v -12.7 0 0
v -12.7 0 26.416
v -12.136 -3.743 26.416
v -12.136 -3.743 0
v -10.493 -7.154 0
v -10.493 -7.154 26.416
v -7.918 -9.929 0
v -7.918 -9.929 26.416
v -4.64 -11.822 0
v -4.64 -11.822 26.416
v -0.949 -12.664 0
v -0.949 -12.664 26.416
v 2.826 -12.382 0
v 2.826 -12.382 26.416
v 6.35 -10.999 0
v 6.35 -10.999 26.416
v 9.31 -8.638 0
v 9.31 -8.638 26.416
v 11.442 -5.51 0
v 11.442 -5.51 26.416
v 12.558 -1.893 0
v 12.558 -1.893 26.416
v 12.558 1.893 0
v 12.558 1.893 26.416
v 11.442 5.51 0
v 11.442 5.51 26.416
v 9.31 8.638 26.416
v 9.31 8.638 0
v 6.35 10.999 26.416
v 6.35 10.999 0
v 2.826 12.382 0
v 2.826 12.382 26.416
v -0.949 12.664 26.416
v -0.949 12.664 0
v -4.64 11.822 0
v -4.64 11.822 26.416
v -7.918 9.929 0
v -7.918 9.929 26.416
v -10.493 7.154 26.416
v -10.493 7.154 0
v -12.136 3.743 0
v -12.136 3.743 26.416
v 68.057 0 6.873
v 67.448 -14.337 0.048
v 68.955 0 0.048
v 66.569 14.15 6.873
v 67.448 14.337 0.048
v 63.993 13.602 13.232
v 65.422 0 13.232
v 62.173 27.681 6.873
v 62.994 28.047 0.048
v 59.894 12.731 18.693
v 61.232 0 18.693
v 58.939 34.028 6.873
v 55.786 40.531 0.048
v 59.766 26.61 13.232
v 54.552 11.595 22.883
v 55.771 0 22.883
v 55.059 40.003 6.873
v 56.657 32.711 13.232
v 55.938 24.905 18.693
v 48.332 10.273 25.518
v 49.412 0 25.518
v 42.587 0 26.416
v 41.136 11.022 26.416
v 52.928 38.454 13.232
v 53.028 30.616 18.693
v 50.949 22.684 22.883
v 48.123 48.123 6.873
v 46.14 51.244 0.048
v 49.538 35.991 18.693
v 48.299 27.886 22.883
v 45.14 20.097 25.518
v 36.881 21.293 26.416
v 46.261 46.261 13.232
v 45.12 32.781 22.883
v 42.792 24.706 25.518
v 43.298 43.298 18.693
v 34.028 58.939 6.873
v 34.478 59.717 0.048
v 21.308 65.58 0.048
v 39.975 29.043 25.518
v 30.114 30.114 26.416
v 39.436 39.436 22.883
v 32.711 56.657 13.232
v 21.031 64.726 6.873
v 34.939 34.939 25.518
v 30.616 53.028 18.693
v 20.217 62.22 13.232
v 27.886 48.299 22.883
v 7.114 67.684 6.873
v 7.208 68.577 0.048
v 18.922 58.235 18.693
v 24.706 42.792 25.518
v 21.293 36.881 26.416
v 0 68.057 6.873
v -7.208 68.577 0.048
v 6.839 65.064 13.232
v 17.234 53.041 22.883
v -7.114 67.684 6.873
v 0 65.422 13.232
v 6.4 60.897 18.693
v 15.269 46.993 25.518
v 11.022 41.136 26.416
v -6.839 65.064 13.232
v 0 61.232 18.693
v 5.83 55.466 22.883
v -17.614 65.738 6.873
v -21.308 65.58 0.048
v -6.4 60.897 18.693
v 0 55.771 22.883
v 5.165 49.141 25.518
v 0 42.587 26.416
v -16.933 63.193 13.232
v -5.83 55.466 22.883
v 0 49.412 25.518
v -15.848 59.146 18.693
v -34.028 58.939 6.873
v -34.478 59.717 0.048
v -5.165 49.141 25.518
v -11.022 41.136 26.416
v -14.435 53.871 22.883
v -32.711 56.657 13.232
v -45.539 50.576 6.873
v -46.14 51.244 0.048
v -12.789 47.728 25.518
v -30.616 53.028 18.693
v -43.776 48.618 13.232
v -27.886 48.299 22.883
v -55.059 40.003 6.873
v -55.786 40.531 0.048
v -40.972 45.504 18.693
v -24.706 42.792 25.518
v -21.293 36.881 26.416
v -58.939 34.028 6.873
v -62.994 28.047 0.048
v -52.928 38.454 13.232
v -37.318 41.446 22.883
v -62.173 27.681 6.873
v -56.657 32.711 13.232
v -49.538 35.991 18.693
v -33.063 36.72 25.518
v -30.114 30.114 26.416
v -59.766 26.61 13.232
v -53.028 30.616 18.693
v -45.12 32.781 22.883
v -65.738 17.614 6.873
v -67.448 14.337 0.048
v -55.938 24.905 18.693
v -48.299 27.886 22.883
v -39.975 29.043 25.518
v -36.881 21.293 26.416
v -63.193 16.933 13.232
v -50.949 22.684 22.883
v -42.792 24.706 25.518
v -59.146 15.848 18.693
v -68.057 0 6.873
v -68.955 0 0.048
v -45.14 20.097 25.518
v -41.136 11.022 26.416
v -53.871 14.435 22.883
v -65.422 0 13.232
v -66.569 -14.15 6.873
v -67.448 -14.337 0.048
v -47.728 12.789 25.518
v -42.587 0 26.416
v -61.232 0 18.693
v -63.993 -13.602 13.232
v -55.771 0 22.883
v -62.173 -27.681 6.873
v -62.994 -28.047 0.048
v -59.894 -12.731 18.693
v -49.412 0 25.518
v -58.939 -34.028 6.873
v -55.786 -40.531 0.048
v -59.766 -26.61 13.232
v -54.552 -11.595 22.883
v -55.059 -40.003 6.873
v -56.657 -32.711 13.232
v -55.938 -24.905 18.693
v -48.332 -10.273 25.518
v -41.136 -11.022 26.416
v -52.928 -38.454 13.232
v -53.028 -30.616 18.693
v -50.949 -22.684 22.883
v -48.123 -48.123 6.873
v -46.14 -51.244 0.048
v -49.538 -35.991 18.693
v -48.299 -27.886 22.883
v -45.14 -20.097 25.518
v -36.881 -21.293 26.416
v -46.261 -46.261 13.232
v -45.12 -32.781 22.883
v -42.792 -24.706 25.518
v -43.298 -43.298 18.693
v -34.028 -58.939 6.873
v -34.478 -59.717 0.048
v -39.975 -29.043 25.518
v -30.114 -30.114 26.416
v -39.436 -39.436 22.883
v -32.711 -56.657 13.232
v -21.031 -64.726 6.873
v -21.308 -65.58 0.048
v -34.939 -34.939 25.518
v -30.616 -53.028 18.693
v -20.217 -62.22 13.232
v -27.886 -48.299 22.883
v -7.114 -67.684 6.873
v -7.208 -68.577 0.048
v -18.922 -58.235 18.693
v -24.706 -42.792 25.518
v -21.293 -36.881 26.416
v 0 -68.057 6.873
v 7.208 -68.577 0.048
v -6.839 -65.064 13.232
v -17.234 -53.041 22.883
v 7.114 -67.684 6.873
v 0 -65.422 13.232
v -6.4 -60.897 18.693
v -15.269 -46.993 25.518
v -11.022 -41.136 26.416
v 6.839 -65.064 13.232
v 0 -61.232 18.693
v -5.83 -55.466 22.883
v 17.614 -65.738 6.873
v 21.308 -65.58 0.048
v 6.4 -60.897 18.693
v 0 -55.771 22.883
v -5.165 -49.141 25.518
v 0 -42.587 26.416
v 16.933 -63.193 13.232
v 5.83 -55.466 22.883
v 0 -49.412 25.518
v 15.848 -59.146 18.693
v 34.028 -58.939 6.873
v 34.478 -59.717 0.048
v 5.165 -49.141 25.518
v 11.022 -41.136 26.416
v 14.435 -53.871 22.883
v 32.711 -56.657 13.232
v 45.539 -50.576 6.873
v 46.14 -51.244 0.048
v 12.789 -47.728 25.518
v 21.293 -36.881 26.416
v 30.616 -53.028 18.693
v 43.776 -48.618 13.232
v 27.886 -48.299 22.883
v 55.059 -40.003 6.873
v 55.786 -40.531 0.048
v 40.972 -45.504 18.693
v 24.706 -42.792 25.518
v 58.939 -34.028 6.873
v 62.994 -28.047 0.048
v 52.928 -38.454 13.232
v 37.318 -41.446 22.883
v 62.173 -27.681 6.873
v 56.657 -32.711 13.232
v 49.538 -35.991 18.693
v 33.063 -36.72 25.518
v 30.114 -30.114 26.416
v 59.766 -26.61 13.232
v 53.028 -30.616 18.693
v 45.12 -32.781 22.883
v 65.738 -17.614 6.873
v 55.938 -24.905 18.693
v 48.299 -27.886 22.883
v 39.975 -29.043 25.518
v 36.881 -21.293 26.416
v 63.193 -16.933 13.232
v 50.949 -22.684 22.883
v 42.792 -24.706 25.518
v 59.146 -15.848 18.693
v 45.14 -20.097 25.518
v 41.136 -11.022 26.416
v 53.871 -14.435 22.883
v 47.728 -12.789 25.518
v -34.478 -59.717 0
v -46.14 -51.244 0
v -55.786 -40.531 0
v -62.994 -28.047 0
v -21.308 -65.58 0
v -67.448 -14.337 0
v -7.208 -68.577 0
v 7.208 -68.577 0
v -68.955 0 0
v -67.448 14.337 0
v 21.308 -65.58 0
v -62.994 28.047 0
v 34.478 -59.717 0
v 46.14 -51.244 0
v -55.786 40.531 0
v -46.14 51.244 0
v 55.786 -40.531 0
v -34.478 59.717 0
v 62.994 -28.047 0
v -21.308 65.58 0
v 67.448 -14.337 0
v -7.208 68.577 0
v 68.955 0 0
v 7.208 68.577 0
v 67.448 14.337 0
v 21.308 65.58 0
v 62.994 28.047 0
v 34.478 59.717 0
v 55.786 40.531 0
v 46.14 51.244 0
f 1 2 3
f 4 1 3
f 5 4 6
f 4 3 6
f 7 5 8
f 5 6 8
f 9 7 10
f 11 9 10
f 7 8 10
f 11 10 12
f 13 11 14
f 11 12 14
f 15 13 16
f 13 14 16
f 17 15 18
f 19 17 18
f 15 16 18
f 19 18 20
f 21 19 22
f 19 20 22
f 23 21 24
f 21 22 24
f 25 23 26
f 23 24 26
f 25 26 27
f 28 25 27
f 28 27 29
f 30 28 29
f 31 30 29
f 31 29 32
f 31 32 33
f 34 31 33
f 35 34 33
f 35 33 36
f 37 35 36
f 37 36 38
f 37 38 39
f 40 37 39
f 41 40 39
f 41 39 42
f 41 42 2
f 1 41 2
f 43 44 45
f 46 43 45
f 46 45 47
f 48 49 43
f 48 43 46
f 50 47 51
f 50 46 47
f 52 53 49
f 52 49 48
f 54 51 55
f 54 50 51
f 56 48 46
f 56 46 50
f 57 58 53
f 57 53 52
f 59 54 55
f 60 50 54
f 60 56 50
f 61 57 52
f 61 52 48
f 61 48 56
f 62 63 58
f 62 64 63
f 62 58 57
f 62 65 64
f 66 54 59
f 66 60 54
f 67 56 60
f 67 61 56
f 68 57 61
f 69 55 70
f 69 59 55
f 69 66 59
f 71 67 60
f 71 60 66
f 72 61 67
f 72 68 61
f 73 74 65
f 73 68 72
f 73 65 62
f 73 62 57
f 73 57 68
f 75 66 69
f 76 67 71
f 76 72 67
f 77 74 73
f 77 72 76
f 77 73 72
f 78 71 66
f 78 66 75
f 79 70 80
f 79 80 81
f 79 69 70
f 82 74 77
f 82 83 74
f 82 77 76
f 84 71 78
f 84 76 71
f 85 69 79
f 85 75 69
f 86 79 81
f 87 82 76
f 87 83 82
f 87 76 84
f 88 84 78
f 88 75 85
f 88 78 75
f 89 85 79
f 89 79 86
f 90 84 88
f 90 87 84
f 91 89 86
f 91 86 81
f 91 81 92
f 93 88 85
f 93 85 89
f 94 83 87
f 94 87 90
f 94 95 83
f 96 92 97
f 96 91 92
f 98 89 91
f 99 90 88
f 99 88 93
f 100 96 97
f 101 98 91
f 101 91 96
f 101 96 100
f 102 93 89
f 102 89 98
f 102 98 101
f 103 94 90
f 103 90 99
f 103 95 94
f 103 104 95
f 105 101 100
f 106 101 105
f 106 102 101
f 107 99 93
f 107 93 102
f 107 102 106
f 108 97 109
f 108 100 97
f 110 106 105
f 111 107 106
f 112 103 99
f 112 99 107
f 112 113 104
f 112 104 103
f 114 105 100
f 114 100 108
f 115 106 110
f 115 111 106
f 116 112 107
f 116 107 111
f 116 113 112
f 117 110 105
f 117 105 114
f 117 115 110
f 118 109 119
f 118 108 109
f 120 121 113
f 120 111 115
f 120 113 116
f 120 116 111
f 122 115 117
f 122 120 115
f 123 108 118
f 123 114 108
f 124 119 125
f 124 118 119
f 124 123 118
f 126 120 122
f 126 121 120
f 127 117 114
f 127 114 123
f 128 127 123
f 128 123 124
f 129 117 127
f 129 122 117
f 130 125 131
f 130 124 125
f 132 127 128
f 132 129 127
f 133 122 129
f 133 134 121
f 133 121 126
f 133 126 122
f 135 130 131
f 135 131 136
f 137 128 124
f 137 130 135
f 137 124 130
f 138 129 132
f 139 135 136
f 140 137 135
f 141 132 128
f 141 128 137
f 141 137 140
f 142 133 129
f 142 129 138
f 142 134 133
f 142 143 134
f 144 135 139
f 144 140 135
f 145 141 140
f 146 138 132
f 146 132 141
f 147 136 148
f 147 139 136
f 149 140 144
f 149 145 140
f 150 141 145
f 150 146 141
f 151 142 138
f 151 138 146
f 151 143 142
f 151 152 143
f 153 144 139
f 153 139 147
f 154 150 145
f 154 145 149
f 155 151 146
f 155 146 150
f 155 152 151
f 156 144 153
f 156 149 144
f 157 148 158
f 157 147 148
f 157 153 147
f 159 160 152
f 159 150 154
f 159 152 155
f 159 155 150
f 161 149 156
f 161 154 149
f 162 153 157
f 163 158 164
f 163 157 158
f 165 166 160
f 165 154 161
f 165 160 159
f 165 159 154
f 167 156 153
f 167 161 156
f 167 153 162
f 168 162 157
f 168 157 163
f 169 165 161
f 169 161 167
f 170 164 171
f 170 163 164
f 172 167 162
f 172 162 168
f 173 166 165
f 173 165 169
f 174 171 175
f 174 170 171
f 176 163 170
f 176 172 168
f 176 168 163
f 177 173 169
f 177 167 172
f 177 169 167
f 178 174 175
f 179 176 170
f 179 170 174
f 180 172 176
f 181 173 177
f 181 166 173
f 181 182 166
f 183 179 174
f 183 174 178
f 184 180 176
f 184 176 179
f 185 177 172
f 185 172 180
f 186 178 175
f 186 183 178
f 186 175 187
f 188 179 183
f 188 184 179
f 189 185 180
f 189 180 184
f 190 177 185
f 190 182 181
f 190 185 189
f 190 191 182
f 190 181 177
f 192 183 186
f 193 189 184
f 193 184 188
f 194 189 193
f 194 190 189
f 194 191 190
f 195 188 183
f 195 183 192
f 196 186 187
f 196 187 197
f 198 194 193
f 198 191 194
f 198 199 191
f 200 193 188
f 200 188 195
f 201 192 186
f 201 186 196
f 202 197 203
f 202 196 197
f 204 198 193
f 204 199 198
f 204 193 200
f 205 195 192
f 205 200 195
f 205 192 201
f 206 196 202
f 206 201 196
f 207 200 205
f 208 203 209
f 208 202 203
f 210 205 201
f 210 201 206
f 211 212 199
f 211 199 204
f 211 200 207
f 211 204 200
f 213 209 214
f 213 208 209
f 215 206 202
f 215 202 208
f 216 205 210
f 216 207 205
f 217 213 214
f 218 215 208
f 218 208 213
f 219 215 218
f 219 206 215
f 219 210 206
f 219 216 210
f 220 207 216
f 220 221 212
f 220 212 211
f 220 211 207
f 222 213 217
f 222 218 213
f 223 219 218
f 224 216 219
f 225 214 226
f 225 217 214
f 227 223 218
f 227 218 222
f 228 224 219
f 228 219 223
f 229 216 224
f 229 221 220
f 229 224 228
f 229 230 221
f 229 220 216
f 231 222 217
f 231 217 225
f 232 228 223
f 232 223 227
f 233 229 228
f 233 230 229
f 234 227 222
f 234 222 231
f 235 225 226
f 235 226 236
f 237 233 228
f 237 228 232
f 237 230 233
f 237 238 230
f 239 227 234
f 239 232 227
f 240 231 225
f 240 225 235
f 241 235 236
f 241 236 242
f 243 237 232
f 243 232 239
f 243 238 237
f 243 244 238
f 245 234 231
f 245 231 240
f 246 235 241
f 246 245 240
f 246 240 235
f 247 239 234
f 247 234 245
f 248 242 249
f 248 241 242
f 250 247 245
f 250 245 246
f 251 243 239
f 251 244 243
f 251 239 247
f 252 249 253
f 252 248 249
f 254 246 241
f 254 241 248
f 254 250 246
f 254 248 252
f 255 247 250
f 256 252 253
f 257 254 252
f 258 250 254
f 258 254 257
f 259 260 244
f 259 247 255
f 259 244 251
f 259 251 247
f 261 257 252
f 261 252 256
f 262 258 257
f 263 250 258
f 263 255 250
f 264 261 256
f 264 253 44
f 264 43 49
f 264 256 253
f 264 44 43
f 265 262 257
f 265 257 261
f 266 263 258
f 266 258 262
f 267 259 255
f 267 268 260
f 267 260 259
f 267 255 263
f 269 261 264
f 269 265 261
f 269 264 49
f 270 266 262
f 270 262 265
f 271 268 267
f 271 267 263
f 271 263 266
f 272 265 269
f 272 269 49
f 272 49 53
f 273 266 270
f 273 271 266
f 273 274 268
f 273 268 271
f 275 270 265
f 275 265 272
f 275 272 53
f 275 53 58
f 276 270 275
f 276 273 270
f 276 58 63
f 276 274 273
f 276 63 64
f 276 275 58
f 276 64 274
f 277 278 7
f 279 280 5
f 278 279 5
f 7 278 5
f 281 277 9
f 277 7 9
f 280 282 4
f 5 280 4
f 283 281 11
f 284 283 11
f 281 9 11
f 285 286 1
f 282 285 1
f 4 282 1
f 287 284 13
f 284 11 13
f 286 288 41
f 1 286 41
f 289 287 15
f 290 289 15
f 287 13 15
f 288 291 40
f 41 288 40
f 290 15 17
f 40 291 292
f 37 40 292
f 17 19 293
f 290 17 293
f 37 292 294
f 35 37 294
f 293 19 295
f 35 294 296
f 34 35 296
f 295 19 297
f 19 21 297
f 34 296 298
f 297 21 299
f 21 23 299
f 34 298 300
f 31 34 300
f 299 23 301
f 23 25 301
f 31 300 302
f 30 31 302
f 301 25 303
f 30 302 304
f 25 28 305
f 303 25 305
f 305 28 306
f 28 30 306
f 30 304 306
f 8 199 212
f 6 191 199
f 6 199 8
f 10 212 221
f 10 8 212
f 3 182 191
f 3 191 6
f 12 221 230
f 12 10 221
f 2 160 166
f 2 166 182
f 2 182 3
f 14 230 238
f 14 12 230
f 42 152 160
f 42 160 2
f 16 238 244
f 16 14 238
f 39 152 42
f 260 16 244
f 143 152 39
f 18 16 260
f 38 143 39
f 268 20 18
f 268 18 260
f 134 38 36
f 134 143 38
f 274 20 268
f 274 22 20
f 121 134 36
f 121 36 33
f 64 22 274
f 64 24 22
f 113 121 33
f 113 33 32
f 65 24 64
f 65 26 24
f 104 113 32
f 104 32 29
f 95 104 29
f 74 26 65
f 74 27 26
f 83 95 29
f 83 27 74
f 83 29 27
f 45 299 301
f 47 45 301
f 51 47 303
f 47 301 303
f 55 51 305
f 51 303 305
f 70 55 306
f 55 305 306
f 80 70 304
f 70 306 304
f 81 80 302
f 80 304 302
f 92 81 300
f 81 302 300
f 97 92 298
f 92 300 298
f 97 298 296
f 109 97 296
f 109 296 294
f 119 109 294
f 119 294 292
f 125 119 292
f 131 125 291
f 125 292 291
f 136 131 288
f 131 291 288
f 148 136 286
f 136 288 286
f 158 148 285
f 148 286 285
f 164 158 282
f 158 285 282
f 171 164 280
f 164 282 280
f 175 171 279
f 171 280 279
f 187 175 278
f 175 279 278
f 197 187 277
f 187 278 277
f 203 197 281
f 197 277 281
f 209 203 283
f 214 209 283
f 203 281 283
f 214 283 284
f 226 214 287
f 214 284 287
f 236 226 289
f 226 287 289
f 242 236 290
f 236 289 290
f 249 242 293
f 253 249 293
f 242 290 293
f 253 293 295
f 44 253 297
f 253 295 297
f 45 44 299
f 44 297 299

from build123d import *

# Parameters (mm, degrees)
F0_R     = 68.95504
F1_DEPTH = 26.416
F2_R     = 26.368041
F4_D     = 25.4


with BuildPart() as f1:
    # F0 (on Top) → F1 (new body)
    with BuildSketch(Plane.XY):
        Circle(F0_R)
    extrude(amount=F1_DEPTH)

    # F2
    f2_edges = [f1.edges().sort_by_distance(p)[0] for p in [
        (-68.95504, 0, 26.416),
    ]]
    fillet(f2_edges, radius=F2_R)

    # F4 (through all)
    with Locations(Plane(origin=(0, 0, 0), x_dir=(1, 0, 0), z_dir=(0, 0, -1))):
        with Locations((0, 0)):
            Hole(F4_D / 2)


solid = f1.part
